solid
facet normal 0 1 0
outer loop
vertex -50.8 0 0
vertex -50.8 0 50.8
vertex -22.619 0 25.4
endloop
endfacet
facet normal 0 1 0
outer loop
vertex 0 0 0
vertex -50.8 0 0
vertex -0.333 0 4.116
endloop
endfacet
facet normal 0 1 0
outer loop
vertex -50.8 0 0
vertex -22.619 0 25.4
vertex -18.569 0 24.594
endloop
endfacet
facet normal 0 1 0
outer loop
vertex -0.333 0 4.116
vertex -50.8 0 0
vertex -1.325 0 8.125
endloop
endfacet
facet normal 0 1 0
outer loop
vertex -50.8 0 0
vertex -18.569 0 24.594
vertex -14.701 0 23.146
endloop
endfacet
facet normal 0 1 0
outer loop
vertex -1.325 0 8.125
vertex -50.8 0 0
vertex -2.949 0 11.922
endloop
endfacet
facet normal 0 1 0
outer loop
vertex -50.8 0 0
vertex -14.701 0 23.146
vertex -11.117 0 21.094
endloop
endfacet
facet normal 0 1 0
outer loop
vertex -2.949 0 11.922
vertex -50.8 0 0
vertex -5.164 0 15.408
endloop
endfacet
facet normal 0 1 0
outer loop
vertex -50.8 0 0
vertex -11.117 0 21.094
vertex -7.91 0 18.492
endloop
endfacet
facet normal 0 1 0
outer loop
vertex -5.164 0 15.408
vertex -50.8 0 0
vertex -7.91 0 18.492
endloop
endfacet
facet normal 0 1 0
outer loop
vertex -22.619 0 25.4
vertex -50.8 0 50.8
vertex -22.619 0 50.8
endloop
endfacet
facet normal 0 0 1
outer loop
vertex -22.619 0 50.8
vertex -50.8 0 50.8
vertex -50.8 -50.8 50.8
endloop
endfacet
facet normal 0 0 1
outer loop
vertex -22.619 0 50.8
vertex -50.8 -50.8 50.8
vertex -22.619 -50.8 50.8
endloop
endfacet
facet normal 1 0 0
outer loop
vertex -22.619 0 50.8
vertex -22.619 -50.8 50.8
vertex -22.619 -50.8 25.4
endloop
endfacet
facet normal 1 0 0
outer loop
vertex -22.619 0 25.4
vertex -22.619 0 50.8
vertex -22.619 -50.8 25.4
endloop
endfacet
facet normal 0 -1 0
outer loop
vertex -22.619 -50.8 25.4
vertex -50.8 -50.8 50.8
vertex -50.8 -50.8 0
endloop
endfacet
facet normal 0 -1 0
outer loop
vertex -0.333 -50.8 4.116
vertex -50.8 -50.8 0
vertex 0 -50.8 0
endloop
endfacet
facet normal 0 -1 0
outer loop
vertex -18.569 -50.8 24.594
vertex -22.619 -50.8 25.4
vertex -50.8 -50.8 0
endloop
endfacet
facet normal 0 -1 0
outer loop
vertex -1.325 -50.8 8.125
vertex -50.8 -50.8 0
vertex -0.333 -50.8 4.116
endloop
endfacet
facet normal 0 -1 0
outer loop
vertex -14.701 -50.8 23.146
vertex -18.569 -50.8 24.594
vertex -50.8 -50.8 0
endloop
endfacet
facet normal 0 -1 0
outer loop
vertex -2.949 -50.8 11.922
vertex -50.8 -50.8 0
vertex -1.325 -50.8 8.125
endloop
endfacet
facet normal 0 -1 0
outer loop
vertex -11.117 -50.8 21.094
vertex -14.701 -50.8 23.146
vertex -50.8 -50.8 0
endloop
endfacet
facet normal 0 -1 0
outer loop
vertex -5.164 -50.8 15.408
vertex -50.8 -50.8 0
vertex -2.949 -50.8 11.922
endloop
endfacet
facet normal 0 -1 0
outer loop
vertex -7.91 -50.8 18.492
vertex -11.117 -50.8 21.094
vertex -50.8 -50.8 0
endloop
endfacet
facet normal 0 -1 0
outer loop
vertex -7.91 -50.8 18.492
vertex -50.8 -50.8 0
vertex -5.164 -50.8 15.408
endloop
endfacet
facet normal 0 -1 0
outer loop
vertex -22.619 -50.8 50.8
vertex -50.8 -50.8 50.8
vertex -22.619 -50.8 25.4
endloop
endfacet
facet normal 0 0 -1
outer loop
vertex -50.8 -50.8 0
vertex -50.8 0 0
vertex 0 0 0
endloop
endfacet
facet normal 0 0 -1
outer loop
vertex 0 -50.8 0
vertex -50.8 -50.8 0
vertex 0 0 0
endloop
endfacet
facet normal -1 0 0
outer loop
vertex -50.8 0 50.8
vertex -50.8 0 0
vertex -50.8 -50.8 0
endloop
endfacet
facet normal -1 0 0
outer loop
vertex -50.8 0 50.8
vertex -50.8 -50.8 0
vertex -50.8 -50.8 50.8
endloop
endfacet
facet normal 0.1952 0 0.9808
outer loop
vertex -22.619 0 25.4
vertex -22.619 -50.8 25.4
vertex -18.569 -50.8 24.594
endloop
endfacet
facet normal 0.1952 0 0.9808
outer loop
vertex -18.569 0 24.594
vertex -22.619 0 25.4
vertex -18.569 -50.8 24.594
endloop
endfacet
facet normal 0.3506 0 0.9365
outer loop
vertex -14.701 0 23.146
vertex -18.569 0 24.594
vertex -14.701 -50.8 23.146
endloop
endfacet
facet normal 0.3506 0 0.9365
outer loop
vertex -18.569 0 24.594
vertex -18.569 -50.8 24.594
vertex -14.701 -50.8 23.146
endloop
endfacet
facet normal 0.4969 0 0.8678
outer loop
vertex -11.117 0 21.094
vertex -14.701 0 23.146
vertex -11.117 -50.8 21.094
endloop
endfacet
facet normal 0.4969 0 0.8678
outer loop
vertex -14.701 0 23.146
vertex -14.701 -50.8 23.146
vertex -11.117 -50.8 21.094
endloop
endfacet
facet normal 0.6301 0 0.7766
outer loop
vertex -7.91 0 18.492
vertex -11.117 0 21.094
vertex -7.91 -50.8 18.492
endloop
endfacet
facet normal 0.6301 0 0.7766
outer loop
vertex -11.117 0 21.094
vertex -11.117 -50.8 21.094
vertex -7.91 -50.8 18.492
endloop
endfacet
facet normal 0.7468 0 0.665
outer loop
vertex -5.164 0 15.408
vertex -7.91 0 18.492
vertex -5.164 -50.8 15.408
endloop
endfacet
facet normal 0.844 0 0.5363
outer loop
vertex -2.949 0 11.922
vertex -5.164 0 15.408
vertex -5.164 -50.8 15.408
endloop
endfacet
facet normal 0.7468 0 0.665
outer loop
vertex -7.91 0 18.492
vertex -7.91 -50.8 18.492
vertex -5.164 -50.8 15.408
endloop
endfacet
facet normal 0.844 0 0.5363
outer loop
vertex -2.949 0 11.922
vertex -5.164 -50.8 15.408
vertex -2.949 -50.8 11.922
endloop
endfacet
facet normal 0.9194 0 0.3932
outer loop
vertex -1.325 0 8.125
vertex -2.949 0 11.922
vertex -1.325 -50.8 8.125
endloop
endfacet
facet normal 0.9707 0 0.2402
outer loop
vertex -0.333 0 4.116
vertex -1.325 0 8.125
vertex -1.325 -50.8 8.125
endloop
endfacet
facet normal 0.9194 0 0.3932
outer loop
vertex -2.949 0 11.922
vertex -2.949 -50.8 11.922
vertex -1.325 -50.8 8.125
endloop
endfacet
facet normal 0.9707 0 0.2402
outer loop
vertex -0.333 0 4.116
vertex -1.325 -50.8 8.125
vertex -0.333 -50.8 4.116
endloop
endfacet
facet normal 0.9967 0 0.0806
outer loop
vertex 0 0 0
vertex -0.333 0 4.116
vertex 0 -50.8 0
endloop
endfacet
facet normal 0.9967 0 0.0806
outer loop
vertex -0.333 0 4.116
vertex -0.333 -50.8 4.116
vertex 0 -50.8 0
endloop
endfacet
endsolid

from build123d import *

# Parameters (mm, degrees)
F0_W     = 50.8
F0_H     = 50.8
F1_DEPTH = 50.8
F3_DEPTH = 50.8


with BuildPart() as f1:
    # F0 (on Front) → F1 (new body)
    with BuildSketch(Plane.XZ):
        with Locations((-25.4, 25.4)):
            Rectangle(F0_W, F0_H)
    extrude(amount=F1_DEPTH)

    # F2 (on face) → F3 (cut)
    with BuildSketch(Plane.XZ.offset(50.8)):
        with BuildLine():
            ThreePointArc((-22.619369, 25.4), (-6.474509, 17.005851), (0, 0))
            Line((0, 0), (0, 50.8))
            Line((0, 50.8), (-22.619369, 50.8))
            Line((-22.619369, 50.8), (-22.619369, 25.4))
        make_face()
    extrude(amount=-F3_DEPTH, mode=Mode.SUBTRACT)


solid = f1.part
